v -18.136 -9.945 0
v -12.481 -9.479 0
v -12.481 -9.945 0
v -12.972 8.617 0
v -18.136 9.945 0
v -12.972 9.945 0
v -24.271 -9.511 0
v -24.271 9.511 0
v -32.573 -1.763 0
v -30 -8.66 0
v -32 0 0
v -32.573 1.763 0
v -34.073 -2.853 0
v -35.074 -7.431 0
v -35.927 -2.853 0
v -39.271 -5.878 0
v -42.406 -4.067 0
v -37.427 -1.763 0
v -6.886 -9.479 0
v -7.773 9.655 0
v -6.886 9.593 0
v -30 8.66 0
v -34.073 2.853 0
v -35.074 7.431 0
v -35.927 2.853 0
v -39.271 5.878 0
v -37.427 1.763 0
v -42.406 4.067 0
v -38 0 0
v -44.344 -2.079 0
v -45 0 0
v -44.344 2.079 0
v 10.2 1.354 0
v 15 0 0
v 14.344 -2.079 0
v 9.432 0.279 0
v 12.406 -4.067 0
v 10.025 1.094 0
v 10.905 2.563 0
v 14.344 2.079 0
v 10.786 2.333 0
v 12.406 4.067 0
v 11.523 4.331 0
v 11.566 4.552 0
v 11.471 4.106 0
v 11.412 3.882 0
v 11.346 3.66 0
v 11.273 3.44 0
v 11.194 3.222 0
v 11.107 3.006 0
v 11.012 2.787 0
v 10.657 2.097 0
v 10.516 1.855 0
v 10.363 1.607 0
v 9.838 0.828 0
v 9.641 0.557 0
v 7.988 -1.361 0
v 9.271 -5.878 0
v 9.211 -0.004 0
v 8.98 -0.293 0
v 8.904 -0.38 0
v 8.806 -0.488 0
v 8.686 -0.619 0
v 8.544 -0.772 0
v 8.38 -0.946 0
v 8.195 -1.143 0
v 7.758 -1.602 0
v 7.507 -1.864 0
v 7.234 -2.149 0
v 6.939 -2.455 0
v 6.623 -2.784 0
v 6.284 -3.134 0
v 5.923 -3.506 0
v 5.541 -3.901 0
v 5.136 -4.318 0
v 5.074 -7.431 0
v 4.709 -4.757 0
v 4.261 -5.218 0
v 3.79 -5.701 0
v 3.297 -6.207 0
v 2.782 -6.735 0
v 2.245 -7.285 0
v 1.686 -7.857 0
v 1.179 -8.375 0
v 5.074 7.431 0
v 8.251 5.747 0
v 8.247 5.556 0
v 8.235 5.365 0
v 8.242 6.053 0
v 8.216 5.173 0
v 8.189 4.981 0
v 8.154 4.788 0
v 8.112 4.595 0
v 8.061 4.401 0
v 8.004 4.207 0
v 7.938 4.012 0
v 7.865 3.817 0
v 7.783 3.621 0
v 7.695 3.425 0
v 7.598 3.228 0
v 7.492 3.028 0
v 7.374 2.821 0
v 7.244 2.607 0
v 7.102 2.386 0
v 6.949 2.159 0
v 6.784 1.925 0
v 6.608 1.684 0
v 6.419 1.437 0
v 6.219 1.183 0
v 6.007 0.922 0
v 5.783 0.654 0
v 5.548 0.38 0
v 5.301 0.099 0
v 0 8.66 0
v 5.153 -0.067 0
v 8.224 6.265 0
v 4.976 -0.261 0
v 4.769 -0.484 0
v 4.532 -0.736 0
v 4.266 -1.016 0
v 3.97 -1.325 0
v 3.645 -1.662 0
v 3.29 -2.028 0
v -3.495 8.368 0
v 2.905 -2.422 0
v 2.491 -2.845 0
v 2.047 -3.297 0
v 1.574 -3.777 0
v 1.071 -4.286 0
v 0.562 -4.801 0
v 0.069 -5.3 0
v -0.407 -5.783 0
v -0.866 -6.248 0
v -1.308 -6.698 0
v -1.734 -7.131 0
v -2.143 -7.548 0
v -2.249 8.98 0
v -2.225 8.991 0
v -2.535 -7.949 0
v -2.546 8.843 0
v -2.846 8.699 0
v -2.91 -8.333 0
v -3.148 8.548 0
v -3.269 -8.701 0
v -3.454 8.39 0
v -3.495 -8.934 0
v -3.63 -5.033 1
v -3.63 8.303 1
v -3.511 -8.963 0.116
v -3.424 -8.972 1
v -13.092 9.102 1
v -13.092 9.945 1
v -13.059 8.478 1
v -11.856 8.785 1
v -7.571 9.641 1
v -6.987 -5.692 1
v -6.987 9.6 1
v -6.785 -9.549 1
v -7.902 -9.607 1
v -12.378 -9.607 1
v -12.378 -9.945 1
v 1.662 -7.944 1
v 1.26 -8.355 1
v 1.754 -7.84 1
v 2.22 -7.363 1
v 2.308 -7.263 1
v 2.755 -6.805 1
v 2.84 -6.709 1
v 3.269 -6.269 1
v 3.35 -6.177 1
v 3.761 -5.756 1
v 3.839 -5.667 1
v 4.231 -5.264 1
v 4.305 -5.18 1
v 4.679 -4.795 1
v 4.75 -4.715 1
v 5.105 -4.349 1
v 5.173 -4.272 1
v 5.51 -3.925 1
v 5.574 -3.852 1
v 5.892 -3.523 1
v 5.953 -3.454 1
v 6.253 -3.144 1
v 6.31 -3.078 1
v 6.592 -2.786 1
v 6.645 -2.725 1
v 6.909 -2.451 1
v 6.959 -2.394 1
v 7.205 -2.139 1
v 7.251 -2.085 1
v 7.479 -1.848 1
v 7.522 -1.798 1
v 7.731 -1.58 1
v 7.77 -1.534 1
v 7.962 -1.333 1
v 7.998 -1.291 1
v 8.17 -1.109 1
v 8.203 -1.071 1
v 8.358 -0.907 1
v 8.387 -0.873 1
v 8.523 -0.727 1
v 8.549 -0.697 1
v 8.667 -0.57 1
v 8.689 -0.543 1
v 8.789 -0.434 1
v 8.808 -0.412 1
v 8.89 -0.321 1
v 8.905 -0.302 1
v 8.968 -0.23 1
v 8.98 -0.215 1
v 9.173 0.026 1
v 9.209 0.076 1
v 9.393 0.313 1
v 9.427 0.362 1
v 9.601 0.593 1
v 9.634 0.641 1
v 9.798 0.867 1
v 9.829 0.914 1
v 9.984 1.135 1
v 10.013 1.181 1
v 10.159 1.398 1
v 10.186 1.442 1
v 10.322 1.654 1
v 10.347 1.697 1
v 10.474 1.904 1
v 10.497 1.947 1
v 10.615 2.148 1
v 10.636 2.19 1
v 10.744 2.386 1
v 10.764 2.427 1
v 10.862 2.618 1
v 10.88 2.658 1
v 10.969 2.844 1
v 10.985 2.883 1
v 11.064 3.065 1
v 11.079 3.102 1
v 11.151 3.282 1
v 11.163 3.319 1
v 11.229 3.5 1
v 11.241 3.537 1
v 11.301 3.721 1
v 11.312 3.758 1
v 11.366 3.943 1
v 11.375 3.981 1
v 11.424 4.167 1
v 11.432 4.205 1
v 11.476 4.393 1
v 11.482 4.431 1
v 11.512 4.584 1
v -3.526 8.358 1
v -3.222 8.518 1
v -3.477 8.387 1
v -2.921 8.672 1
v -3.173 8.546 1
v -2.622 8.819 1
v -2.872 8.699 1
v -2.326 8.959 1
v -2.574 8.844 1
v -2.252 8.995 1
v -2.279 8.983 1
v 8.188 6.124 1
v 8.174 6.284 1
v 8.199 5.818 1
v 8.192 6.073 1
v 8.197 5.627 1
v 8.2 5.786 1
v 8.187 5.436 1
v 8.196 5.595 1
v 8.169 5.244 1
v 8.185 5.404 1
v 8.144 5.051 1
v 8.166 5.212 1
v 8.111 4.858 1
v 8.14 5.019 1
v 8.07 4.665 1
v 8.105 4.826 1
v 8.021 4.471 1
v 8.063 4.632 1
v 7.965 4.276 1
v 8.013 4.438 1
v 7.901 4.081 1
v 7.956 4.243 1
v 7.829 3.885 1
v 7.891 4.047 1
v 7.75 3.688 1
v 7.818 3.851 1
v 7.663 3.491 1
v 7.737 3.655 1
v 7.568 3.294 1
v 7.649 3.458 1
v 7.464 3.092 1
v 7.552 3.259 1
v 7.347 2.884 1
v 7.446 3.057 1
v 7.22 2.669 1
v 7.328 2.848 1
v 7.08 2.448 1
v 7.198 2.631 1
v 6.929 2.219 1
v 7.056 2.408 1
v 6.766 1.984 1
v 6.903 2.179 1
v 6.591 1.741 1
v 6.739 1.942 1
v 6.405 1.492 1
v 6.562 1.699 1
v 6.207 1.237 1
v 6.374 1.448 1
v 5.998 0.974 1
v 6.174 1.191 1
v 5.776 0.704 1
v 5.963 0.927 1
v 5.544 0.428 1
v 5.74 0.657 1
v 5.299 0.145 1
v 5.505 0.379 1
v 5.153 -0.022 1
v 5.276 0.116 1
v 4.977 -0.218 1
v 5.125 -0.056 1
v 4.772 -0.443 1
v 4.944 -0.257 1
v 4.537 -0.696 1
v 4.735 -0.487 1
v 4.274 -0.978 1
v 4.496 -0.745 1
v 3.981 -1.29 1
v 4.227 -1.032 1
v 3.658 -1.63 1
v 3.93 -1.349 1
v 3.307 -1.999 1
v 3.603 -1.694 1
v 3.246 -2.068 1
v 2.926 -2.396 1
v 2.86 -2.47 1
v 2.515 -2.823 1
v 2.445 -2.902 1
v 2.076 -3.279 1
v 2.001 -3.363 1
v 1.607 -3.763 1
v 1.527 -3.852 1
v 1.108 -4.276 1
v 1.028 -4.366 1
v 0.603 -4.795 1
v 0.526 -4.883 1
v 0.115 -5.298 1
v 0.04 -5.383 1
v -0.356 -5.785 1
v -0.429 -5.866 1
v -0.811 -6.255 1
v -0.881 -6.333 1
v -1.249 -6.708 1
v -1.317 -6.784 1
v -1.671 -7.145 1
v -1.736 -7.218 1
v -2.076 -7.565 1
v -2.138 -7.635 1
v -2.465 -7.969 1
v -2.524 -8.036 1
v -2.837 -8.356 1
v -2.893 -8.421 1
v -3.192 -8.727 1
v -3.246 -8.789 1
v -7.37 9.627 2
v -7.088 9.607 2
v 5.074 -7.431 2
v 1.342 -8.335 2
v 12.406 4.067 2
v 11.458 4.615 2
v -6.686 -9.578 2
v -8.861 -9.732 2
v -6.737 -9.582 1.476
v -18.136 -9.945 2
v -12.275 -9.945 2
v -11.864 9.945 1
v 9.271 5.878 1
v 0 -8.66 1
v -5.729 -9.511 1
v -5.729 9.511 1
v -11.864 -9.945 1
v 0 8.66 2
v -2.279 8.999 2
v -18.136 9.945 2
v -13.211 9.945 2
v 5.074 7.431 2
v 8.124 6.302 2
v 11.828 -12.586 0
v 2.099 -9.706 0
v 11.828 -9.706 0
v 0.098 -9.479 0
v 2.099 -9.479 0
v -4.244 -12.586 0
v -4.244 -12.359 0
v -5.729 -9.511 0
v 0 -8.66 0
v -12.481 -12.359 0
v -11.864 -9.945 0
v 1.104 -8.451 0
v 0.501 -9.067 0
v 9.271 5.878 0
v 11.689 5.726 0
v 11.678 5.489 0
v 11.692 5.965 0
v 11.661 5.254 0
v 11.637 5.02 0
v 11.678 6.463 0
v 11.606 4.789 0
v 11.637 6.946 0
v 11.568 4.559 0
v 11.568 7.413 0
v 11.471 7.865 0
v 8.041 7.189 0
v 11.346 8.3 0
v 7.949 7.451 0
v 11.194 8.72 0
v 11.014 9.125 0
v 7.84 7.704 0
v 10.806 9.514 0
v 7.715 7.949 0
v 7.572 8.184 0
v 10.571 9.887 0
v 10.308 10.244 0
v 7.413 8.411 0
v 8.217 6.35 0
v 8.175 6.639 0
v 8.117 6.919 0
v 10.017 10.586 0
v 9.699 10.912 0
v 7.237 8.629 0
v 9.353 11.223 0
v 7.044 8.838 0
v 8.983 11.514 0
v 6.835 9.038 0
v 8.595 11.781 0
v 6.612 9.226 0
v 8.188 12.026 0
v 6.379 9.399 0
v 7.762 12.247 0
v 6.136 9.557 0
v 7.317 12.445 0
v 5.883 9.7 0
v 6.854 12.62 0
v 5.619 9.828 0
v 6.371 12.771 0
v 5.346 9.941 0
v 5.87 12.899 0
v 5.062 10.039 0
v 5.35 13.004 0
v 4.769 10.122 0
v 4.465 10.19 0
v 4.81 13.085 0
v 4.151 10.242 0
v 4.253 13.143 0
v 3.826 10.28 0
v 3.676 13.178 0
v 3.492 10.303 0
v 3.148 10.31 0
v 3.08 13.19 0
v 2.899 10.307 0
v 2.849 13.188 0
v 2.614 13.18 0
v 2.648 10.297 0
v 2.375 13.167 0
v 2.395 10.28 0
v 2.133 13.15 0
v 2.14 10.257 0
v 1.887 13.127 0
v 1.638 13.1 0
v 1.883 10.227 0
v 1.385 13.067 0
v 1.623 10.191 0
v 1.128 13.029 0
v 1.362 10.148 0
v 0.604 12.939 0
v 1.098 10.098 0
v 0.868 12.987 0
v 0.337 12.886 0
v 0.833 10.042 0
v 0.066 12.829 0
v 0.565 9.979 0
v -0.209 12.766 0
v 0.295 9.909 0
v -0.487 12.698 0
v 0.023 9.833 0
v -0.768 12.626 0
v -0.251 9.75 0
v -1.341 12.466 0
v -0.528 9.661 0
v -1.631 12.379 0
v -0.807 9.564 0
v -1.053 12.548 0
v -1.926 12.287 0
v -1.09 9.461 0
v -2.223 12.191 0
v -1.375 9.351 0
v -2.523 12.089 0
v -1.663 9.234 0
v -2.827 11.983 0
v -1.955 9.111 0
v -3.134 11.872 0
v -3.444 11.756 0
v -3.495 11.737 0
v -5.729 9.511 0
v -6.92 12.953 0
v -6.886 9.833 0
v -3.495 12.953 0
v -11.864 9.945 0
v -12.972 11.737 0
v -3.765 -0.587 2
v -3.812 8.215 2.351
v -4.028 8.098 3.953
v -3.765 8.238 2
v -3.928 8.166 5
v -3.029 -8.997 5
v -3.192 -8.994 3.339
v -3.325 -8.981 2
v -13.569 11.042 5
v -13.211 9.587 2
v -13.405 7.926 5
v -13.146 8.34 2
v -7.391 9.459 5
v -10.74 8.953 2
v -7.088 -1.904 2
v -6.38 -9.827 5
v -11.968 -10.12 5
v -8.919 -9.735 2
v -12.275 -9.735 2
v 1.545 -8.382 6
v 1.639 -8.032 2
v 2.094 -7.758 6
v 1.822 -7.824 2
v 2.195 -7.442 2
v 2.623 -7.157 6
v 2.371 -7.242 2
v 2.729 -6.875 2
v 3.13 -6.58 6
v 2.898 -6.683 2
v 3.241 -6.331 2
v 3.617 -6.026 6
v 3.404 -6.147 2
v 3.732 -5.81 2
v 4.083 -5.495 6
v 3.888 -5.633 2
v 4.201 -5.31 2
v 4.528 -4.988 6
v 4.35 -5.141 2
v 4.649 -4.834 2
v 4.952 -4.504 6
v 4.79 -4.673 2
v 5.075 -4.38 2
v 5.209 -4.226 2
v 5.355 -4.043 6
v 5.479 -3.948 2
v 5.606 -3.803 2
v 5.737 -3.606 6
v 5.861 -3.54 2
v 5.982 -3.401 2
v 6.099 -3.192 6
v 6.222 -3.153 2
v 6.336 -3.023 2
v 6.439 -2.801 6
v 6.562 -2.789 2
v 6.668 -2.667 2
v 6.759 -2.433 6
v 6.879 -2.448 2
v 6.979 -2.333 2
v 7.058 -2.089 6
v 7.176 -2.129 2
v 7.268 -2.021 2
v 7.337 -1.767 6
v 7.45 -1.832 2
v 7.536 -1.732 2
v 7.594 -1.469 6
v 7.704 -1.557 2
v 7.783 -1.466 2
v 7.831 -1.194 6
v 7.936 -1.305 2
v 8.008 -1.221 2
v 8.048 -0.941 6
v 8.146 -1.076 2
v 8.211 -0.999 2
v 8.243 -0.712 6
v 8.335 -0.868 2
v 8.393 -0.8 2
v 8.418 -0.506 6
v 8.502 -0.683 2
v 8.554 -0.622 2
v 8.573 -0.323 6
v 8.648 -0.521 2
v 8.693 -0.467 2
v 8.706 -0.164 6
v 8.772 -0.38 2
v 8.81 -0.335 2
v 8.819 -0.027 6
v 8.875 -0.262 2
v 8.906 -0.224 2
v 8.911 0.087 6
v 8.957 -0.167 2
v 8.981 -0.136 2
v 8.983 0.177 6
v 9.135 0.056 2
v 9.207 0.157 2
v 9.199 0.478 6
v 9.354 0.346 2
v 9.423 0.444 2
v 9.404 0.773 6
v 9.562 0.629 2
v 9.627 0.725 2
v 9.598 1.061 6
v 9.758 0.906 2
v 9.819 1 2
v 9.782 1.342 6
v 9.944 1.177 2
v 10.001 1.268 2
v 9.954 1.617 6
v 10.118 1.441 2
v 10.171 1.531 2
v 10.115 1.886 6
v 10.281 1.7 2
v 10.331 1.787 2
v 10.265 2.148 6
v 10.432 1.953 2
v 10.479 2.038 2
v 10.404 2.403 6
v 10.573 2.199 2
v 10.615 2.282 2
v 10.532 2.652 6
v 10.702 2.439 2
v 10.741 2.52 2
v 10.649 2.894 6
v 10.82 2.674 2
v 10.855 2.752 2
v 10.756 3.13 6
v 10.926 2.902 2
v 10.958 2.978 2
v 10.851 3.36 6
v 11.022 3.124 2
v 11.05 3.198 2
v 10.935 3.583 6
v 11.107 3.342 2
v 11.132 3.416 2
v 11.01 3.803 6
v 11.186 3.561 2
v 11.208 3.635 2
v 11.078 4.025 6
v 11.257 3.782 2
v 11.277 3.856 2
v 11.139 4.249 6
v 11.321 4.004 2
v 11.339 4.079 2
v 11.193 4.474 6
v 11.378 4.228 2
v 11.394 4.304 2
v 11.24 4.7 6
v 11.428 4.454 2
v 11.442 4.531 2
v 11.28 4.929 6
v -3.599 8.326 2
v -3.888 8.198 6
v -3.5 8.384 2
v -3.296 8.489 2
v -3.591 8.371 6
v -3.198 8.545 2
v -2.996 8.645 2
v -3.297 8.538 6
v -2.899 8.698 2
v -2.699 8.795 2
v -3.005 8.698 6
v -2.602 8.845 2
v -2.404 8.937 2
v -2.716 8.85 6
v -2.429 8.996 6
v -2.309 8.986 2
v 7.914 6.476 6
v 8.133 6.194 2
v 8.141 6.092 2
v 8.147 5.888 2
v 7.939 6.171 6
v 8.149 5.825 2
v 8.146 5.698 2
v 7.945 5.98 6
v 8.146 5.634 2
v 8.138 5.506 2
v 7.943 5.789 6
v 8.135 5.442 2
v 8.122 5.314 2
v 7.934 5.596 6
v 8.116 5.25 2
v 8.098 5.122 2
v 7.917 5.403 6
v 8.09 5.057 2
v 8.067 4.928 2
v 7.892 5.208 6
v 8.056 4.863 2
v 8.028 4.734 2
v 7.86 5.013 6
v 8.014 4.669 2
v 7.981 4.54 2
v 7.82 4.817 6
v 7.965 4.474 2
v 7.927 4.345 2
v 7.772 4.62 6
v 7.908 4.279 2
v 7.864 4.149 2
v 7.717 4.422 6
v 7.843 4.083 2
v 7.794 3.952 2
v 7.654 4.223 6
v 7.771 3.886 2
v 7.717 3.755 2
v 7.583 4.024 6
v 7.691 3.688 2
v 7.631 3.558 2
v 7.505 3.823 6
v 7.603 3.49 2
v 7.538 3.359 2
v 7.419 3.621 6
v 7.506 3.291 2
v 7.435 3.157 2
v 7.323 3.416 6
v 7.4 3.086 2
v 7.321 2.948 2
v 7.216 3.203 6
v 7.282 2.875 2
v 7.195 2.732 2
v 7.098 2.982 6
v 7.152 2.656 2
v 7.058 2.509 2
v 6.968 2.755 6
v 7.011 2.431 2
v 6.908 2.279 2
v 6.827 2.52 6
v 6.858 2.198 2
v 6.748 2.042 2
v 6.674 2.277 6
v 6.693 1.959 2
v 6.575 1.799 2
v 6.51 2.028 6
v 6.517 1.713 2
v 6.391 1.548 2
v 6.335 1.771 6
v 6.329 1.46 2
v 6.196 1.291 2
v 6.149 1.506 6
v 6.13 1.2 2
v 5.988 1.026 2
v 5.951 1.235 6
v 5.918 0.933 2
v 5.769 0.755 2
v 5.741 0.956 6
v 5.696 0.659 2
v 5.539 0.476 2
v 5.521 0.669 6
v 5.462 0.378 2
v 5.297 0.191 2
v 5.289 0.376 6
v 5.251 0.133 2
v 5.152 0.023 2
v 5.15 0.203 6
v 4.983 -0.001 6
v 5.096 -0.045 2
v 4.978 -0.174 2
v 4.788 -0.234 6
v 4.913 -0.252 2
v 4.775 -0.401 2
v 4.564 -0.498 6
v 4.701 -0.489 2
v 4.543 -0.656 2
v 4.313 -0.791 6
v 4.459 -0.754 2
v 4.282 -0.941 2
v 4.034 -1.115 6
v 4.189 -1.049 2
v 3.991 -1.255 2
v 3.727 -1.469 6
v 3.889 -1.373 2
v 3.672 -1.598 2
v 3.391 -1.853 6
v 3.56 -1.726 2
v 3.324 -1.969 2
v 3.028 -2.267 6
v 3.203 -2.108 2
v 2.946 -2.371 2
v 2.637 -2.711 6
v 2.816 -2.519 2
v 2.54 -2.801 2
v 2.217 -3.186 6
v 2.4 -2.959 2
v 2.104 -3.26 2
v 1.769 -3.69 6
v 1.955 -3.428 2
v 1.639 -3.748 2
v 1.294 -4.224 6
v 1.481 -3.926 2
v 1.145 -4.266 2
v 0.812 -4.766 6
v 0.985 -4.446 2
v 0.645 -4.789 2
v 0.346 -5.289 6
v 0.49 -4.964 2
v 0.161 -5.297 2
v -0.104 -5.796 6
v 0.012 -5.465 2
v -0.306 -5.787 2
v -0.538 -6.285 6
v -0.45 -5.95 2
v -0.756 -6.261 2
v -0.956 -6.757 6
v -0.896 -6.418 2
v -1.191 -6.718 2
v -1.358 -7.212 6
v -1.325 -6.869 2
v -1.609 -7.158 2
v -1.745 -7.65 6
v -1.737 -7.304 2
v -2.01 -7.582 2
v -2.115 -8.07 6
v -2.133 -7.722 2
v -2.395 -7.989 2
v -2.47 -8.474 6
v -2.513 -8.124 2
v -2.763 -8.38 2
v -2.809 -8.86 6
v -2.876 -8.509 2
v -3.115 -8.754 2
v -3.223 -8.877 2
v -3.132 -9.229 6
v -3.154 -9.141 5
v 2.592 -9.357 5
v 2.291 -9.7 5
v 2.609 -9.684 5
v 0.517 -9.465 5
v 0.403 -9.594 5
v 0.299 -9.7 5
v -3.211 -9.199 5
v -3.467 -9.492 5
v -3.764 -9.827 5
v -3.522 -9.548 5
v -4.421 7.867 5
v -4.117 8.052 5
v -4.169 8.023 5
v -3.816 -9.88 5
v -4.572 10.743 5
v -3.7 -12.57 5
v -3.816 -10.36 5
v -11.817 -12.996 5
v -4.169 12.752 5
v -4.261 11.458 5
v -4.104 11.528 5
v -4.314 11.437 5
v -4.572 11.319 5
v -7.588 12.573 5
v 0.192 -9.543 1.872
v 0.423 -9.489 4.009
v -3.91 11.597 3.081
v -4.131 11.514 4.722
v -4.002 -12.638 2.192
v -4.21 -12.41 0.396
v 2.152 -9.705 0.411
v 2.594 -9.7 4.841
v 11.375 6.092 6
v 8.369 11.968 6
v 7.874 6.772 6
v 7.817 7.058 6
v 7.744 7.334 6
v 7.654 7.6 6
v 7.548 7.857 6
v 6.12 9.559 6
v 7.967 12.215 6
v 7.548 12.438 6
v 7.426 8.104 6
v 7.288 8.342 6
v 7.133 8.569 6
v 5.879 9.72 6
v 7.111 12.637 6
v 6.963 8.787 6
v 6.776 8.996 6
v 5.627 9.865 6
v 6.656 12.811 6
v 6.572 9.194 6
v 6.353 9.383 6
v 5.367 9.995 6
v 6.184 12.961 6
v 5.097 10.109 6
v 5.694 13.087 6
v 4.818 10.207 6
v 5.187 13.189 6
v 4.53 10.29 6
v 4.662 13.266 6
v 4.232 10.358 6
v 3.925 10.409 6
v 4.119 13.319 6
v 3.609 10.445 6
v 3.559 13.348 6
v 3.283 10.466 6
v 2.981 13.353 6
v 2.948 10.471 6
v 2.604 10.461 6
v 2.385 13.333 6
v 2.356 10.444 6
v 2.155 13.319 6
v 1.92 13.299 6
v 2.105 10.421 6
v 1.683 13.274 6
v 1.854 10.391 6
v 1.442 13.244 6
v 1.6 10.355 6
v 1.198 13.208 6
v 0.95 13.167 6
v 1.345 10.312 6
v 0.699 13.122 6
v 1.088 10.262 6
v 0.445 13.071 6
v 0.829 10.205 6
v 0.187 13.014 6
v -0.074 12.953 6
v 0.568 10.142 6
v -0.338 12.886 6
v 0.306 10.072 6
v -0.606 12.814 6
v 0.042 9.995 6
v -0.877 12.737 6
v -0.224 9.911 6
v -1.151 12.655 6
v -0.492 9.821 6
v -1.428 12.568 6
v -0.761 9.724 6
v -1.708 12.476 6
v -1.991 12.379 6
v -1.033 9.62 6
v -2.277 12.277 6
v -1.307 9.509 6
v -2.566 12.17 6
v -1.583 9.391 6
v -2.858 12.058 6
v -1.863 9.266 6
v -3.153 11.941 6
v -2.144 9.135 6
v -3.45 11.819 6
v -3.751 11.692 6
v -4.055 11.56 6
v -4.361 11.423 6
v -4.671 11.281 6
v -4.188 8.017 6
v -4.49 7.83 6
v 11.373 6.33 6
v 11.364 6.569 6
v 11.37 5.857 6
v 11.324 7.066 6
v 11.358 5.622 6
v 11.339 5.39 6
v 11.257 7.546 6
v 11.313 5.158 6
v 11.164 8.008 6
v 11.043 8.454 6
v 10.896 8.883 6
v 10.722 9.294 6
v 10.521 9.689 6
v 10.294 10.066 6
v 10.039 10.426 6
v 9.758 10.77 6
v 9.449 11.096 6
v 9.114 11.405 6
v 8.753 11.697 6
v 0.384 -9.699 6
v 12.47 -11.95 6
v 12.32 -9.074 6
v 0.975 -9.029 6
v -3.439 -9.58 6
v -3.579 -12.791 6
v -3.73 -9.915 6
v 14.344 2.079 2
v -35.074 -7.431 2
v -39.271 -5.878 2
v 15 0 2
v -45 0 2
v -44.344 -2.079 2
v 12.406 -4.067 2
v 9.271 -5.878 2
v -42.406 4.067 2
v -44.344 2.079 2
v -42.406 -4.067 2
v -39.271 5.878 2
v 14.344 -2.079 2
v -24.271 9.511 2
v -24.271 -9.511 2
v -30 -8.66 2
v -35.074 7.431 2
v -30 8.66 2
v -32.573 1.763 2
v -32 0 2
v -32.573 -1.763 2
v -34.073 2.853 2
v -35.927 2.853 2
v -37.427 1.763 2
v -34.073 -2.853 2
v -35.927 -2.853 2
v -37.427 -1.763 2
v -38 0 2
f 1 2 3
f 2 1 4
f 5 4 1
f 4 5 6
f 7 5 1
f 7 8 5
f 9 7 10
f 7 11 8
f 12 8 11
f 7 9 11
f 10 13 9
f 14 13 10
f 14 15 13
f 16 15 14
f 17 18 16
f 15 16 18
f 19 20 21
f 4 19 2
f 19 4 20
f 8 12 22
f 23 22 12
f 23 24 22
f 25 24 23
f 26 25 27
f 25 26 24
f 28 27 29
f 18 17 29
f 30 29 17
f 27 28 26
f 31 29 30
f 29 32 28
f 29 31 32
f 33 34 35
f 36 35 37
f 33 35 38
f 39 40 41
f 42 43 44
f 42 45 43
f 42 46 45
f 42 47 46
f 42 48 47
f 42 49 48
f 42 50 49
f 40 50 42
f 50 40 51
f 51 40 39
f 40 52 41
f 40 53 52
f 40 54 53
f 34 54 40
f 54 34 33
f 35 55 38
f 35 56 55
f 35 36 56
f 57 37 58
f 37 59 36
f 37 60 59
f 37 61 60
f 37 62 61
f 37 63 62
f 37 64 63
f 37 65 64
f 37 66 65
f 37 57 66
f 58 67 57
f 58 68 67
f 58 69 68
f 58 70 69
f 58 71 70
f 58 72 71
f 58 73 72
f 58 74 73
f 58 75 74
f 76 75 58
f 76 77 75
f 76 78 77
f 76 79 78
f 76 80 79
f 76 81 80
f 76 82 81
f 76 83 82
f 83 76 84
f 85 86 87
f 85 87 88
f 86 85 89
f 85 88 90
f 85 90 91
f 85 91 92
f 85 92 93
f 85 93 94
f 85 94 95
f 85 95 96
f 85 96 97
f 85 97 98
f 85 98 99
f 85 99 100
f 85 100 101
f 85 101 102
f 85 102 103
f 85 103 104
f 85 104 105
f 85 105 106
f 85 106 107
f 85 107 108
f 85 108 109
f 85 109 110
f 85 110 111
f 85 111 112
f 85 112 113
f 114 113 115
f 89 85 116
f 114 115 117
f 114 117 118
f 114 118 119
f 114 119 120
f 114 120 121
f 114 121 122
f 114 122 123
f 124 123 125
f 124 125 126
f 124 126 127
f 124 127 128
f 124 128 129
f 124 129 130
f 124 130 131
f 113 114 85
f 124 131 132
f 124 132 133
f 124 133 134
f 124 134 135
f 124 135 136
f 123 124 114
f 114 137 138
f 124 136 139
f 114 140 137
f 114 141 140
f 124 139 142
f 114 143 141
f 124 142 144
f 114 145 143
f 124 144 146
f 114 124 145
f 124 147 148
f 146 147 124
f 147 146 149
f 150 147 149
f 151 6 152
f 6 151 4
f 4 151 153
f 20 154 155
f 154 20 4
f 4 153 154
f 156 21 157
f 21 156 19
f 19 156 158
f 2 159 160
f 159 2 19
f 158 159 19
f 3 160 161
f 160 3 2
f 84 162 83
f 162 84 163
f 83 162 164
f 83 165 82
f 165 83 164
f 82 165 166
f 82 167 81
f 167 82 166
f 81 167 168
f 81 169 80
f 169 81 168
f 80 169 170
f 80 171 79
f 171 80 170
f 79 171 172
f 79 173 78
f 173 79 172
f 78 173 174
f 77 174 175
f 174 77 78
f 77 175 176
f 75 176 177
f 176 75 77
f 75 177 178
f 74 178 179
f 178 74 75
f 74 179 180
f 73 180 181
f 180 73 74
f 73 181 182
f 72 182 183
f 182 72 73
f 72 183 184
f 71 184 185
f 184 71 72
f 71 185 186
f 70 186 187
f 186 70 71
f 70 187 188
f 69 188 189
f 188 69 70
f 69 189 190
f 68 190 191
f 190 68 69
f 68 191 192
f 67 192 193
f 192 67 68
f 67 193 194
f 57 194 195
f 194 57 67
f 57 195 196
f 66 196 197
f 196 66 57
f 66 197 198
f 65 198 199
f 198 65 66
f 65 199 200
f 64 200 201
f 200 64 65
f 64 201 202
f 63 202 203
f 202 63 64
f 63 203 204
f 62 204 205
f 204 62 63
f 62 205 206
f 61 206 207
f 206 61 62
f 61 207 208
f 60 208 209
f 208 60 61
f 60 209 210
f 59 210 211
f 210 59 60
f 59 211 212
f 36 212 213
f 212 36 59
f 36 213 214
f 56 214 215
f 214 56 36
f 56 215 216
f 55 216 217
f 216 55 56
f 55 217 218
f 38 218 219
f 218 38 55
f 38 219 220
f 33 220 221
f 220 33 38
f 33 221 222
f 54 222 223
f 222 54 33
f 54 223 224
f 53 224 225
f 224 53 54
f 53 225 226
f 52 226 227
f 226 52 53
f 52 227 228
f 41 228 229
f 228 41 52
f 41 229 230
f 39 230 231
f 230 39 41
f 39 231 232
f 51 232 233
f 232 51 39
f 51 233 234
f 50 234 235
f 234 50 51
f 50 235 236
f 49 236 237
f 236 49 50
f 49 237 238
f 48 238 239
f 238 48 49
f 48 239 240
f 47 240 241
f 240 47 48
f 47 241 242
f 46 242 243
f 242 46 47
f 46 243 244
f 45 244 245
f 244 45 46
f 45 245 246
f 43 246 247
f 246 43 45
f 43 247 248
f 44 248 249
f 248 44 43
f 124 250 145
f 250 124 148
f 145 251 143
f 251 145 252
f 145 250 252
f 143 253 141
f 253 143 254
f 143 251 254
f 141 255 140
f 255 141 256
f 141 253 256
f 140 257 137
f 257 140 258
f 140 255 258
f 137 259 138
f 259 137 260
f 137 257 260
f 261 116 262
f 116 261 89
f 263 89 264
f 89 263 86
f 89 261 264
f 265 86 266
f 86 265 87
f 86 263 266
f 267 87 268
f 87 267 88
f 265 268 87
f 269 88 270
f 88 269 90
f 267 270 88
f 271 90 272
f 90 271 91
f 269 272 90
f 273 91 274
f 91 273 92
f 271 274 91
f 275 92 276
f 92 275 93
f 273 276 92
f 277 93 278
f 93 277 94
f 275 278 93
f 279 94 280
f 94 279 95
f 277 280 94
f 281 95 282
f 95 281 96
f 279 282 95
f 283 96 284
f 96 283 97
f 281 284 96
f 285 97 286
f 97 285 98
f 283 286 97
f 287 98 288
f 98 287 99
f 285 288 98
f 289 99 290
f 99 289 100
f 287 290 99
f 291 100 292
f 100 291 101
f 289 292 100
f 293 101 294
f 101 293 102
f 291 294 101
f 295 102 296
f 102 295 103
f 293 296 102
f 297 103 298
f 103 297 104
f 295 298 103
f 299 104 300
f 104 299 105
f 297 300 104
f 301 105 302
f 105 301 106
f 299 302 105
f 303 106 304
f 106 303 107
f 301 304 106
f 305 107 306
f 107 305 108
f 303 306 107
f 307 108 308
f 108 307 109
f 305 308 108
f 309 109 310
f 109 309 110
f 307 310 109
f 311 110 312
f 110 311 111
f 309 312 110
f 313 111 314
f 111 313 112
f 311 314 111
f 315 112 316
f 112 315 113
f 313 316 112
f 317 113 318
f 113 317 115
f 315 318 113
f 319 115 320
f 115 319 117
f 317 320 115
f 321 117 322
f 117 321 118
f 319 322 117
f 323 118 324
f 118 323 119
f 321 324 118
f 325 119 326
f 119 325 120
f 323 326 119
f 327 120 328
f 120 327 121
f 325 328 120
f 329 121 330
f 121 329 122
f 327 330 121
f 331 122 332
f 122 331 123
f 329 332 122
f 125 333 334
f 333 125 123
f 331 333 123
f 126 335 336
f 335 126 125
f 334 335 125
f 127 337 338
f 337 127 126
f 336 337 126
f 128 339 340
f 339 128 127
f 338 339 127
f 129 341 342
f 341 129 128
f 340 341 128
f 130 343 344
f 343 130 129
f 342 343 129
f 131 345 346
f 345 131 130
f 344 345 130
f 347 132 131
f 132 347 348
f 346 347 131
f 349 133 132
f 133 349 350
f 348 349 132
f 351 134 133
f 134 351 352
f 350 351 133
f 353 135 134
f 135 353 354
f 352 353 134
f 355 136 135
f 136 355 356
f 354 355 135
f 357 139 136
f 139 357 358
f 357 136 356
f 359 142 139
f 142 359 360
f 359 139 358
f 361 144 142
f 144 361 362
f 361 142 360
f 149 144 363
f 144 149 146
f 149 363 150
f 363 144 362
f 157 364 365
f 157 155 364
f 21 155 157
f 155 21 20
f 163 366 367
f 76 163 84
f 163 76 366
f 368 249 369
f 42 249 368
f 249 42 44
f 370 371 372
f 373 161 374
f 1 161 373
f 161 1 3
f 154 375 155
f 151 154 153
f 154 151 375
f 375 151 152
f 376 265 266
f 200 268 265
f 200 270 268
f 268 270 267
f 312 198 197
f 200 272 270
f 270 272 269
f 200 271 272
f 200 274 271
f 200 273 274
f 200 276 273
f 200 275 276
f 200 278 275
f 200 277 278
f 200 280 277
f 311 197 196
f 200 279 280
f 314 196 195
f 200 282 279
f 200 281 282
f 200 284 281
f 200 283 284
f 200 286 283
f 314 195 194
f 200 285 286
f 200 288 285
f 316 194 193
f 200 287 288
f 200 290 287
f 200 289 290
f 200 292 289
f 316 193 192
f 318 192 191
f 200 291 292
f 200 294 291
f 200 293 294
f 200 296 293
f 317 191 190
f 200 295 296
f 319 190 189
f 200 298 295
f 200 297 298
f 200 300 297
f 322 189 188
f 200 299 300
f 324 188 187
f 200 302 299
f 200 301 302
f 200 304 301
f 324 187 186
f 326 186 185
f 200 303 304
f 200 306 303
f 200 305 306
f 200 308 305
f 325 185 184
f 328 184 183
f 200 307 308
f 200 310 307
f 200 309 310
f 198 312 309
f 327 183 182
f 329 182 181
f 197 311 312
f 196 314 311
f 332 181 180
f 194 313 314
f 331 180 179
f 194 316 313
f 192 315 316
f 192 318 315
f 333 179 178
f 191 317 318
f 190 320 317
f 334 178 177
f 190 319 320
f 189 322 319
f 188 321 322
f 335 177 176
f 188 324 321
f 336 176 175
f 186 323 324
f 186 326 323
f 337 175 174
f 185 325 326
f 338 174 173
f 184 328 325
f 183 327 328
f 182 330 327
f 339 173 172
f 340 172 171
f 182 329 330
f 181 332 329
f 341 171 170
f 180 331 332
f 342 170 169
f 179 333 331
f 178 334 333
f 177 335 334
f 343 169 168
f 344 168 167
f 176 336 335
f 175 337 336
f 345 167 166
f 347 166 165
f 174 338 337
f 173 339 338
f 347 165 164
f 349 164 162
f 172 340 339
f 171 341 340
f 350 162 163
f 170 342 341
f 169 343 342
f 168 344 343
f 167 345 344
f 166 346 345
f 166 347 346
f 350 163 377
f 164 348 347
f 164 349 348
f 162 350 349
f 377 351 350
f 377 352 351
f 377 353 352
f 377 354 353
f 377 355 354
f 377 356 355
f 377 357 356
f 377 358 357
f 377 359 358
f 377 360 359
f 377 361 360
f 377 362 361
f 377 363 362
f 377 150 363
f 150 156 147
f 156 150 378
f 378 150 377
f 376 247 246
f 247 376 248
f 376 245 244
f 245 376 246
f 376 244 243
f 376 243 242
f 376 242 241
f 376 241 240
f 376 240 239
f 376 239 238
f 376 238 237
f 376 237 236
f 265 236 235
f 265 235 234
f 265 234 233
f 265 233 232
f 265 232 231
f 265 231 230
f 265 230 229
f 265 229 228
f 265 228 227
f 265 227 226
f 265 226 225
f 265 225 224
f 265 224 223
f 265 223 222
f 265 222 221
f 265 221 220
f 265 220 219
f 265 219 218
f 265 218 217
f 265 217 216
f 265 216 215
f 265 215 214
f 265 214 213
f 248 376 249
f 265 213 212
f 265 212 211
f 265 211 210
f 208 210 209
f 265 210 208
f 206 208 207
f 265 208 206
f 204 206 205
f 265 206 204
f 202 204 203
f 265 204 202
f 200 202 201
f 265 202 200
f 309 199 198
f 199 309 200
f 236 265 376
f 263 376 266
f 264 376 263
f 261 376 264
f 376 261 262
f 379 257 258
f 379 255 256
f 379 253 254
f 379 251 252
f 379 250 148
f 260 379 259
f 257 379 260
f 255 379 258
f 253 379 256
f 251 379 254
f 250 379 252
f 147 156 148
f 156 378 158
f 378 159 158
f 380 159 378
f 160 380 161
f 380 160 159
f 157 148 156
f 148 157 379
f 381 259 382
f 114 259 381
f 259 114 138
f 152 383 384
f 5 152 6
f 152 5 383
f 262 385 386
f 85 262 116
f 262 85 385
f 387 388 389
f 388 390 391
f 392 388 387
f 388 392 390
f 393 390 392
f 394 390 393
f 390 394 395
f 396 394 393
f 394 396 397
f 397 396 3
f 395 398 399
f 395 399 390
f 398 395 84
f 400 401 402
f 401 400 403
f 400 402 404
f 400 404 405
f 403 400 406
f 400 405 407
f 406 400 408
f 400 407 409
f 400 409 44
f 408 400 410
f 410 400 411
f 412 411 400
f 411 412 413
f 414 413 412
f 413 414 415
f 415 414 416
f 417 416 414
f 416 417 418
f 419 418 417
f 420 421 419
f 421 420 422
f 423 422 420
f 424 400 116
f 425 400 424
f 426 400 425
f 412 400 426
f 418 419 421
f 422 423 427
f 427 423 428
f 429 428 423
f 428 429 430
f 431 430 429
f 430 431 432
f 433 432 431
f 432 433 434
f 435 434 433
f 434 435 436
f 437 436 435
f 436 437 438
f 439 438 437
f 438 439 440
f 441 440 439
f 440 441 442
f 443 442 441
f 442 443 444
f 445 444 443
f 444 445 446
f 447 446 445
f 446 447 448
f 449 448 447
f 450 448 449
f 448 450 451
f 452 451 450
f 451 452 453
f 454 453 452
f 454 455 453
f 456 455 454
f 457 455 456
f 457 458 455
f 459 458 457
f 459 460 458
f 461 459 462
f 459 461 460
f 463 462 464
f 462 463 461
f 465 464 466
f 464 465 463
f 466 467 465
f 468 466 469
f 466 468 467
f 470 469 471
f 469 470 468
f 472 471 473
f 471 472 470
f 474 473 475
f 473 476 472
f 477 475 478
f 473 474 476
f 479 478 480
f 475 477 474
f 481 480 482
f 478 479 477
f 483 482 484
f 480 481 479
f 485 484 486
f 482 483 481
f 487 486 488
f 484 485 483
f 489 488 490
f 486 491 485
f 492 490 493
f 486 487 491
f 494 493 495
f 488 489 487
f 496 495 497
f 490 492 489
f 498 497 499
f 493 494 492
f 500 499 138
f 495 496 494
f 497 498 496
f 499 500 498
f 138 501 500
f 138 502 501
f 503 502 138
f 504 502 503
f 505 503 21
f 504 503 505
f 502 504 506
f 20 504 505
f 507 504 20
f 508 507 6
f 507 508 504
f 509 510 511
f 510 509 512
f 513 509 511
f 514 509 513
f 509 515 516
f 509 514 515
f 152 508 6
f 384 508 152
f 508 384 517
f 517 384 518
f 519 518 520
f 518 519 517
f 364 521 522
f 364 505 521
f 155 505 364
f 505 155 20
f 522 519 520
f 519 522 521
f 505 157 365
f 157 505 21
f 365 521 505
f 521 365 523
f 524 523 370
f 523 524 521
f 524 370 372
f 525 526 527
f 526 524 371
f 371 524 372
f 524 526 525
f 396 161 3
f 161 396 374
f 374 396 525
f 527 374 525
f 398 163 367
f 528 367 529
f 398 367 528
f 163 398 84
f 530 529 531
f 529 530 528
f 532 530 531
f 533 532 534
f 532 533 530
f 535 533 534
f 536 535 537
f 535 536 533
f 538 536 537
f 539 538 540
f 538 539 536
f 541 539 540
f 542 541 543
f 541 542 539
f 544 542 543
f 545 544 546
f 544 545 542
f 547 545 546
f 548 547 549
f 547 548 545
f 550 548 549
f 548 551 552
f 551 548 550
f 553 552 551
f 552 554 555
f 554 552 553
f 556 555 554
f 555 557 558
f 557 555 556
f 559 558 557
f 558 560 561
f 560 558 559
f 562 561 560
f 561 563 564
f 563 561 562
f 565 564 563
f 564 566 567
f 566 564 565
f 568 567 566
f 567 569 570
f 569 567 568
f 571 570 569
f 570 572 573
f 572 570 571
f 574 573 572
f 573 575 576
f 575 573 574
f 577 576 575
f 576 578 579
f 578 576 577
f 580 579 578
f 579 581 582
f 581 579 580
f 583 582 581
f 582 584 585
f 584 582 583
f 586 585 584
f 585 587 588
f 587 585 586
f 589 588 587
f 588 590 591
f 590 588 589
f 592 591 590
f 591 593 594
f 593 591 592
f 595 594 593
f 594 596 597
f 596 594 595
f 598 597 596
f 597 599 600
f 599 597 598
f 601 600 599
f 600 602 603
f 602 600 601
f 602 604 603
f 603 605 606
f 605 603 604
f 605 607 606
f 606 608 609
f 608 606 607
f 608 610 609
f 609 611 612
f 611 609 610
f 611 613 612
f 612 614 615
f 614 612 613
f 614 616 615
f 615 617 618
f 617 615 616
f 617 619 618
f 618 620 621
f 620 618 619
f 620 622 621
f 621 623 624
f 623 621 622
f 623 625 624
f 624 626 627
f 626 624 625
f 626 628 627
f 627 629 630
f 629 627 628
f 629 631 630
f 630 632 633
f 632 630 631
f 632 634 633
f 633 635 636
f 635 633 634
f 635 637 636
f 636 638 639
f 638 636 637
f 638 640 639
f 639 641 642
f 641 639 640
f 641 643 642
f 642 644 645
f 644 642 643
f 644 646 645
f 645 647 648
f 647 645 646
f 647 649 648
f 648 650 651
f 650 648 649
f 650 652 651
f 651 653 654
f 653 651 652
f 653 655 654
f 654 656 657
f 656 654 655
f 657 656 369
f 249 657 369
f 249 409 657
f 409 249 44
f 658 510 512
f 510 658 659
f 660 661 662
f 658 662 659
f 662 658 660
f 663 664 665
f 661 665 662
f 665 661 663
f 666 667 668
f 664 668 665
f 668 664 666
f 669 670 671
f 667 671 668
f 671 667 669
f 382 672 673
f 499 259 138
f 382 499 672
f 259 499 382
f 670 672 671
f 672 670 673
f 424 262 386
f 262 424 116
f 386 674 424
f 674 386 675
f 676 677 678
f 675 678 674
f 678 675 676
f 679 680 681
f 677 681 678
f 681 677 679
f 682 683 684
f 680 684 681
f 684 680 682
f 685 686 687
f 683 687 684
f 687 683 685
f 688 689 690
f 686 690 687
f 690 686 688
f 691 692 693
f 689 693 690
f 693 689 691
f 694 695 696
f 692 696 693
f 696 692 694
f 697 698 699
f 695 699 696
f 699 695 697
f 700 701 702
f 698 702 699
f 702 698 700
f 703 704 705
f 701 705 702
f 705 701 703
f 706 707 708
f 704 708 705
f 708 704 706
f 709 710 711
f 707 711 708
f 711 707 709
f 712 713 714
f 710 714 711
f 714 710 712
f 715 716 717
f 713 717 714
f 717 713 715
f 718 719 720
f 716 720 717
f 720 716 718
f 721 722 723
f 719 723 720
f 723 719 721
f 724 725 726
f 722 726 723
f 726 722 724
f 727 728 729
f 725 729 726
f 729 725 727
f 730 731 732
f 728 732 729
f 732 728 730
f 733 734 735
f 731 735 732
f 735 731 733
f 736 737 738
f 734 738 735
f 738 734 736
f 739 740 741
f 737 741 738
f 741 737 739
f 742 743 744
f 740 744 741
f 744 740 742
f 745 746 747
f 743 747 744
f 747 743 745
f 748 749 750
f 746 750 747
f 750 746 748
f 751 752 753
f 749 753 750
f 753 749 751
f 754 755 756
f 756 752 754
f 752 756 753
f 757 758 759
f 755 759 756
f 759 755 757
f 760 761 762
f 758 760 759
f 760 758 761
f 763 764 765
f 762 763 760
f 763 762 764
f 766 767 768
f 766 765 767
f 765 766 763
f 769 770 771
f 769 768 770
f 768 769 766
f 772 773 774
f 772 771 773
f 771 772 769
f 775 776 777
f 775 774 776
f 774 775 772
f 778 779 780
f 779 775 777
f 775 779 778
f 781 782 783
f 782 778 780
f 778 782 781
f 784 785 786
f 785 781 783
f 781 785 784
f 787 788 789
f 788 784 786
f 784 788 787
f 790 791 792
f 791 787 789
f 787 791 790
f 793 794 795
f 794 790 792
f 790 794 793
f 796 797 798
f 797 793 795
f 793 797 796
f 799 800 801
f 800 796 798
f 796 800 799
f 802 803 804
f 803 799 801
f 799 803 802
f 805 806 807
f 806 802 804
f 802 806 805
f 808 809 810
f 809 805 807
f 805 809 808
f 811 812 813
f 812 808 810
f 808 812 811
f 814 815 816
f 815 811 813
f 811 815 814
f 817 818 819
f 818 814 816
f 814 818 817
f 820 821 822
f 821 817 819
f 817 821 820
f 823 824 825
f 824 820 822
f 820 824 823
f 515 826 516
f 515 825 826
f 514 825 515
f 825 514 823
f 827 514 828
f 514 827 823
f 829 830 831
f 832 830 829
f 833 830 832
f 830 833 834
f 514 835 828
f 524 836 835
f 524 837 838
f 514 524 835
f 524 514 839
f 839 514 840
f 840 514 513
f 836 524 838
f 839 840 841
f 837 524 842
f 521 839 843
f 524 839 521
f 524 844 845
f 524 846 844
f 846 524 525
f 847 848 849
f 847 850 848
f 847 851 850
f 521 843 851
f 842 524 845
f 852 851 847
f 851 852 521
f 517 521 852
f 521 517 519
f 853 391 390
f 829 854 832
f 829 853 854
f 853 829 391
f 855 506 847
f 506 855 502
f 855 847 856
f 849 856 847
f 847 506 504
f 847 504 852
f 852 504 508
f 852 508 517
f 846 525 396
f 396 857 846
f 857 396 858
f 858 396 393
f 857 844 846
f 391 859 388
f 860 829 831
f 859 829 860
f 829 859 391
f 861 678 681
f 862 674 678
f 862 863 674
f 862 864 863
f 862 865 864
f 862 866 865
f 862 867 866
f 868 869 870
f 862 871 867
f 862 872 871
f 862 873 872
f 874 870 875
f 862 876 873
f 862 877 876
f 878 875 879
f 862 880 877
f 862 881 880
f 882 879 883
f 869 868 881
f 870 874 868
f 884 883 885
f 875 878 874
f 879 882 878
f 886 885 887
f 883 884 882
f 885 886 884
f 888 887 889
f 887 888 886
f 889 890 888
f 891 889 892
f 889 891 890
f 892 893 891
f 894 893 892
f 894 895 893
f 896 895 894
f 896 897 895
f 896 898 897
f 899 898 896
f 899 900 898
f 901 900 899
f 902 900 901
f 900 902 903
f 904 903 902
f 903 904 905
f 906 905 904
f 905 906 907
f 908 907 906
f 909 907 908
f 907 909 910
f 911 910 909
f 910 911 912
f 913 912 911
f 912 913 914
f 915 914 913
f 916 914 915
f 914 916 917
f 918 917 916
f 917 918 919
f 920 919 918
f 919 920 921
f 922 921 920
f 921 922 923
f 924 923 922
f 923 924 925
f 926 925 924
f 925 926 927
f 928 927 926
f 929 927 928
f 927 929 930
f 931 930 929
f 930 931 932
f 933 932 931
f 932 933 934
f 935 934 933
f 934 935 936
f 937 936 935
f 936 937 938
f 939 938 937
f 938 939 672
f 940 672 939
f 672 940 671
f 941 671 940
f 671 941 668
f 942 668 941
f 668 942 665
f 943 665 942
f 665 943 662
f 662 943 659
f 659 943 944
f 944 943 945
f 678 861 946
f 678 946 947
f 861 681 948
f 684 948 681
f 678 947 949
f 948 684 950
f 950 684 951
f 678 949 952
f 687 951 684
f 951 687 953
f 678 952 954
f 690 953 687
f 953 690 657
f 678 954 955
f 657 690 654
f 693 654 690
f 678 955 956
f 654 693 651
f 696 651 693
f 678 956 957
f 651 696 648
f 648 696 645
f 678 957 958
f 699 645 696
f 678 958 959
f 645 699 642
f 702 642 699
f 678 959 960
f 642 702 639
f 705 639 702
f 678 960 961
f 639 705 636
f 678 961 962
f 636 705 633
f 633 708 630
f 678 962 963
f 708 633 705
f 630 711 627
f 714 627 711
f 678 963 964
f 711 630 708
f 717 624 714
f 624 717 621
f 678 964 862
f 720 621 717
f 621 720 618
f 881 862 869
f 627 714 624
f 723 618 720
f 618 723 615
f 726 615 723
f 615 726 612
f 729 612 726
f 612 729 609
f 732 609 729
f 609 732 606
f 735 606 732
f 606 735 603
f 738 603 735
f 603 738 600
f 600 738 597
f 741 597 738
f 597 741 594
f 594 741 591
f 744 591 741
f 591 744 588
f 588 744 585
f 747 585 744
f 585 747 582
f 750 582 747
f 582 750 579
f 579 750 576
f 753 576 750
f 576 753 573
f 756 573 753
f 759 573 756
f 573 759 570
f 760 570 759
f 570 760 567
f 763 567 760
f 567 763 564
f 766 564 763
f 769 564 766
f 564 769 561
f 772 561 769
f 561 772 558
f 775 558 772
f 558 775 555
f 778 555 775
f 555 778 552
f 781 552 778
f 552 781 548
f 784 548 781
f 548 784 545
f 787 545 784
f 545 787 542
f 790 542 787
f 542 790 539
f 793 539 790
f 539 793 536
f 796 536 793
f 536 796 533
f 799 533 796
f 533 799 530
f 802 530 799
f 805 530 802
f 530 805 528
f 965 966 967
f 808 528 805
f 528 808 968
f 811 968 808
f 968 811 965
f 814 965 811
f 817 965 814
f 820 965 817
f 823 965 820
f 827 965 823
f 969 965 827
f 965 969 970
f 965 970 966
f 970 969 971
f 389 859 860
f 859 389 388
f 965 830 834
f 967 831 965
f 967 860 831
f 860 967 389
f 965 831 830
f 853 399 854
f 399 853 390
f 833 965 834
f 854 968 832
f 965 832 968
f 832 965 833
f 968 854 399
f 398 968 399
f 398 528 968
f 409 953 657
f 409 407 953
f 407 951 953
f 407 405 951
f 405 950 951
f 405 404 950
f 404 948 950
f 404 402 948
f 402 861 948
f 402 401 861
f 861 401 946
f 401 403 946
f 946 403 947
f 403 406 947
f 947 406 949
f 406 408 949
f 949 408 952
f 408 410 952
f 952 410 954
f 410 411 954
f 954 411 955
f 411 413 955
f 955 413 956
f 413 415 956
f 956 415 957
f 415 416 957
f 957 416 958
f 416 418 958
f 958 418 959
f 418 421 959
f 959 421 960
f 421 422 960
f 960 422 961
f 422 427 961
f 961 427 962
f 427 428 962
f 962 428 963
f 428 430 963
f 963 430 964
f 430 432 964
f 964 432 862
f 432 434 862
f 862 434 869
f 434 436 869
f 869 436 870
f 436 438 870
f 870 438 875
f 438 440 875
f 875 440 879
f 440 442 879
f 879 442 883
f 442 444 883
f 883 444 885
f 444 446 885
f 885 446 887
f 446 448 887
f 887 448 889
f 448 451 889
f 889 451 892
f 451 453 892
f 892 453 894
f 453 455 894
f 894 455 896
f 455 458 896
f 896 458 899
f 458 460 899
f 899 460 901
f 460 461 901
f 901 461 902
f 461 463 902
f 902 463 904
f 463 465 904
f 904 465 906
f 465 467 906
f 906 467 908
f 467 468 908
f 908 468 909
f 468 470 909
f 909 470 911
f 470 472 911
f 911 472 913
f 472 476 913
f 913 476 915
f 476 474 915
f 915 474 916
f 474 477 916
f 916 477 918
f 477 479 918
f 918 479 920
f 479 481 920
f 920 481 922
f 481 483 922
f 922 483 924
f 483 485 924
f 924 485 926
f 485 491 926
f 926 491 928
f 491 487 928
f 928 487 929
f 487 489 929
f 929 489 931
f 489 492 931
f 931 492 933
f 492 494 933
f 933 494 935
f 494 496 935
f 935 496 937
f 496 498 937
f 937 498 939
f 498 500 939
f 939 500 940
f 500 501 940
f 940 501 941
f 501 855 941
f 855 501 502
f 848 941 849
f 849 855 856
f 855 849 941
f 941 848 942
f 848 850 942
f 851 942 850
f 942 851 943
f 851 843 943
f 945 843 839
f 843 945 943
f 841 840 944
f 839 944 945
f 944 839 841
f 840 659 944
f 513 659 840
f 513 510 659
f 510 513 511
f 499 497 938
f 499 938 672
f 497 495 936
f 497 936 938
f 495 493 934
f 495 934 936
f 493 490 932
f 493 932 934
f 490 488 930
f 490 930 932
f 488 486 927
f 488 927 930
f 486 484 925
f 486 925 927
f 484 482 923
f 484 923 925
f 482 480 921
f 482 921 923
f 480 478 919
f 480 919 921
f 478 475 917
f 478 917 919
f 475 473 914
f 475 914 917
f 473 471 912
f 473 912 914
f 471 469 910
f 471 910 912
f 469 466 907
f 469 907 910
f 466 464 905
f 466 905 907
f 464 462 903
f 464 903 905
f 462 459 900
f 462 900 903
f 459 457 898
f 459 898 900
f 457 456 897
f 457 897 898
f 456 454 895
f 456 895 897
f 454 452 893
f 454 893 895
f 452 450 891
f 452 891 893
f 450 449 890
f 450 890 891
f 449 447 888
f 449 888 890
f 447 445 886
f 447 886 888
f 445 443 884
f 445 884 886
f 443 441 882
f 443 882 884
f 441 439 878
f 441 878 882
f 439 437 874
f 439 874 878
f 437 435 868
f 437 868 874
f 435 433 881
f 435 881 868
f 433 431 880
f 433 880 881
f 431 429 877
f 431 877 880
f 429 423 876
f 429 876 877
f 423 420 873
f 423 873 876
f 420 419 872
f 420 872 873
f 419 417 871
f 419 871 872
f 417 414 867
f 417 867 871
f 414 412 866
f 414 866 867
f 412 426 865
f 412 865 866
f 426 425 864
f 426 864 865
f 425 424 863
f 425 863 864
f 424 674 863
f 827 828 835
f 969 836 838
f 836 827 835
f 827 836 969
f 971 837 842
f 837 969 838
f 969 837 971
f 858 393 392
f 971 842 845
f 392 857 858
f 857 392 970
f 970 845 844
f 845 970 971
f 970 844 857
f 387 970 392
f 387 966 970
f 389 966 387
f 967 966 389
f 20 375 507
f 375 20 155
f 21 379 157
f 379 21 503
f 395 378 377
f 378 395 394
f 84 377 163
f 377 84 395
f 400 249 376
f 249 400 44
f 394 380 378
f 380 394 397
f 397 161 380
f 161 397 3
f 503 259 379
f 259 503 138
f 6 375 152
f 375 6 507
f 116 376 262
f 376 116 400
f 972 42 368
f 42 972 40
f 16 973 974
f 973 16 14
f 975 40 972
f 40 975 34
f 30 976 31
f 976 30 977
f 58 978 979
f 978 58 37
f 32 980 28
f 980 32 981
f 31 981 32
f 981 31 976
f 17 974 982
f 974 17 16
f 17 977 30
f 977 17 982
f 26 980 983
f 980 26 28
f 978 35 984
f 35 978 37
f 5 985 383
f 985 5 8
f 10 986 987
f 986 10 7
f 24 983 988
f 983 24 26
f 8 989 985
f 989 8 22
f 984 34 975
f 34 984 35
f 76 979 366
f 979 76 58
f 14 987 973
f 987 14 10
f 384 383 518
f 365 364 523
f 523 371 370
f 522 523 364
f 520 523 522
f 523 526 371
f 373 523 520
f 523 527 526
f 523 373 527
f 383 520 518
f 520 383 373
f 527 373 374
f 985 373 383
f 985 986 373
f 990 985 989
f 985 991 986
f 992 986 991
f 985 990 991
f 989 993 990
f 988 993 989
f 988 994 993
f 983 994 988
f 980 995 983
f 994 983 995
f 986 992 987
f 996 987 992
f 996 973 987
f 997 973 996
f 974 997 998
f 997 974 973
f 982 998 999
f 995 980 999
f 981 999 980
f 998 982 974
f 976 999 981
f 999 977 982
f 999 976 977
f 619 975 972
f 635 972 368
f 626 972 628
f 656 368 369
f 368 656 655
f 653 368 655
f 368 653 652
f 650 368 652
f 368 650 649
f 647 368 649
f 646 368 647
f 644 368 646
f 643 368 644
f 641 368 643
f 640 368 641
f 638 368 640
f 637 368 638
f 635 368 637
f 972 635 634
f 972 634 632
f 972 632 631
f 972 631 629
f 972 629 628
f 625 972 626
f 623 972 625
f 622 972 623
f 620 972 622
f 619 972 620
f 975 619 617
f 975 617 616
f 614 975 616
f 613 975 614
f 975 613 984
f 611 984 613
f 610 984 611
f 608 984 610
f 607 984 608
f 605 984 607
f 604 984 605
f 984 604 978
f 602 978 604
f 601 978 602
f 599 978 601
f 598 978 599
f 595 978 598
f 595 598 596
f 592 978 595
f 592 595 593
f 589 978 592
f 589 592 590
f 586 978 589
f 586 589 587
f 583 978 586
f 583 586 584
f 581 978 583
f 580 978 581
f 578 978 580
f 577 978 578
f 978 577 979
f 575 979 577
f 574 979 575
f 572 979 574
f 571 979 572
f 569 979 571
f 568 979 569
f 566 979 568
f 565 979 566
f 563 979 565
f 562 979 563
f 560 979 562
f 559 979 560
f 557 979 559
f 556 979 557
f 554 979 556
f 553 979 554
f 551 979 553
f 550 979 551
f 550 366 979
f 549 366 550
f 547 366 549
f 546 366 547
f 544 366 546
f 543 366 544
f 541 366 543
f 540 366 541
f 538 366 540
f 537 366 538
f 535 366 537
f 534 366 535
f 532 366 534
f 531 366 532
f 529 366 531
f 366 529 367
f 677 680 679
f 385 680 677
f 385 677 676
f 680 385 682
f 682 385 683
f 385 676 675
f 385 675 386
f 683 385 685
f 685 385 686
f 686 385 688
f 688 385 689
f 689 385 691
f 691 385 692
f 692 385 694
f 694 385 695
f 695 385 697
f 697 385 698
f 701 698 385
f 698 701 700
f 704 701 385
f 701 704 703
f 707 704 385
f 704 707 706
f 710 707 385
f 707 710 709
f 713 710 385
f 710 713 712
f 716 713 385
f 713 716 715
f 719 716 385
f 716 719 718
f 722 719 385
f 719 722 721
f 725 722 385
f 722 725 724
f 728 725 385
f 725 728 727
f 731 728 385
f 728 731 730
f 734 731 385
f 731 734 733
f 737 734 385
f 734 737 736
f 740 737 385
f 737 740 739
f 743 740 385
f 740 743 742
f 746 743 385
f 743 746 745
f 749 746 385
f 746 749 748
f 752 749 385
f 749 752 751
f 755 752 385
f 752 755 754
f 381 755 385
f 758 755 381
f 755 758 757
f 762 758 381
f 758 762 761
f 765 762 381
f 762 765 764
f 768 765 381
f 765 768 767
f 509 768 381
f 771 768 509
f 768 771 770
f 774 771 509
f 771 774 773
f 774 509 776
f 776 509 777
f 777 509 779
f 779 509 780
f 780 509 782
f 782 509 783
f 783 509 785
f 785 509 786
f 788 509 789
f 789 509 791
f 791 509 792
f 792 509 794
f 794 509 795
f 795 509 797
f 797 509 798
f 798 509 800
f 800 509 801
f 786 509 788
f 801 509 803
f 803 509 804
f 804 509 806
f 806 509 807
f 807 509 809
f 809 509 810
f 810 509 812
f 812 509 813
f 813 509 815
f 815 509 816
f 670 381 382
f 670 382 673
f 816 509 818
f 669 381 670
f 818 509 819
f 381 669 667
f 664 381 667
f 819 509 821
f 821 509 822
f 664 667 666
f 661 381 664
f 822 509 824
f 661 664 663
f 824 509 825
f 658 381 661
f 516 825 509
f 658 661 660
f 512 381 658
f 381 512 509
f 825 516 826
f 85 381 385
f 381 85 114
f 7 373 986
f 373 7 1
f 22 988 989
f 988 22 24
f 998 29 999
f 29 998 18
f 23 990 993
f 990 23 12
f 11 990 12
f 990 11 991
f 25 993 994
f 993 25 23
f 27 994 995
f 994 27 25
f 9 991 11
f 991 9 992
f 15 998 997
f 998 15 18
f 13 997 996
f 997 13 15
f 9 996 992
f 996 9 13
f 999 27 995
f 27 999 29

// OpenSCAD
Font_name = "Chewy"; // Font utilizzato

number = "12"; // numero da stampare
height = [5,6,4,5,4,3,5,4,6,4,3,5,4,6]; // varia l'altezza di ogni numero della scritta
spacing = [10,10,10,10,10,10,10,10]; // spazio tra i numeri

twist = -3; // [-10:0.5:10] effetto tridimensionale del singolo numero da stampare
center = 6; // [0:1:70] twist rotation

module targhetta(Text) {

    for (i = [0 : len(Text) -1]) {
       linear_extrude(height = height[i], twist = twist, $fn = 100) {
            translate ([(spacing[i]*i)-center,0,0])
            text(size = 25, text = Text[i], font = Font_name, halign = "center", valign= "center", $fn = 100);
        }
    }
}

translate([0,0,0])
difference(){
translate([0,0,0]) targhetta(number);

intersection(){
scale([1.5,0.5,1])translate([-10,0,0])linear_extrude(1) circle(20);
targhetta(number);
}
}

difference(){
scale([1.5,0.5,1])translate([-10,0,0])linear_extrude(2) circle(20);
intersection(){
scale([1.5,0.5,1])translate([-10,0,0])linear_extrude(1) circle(20);
targhetta(number);
}
translate([-35,0,0])cylinder(5,3,3);
}
